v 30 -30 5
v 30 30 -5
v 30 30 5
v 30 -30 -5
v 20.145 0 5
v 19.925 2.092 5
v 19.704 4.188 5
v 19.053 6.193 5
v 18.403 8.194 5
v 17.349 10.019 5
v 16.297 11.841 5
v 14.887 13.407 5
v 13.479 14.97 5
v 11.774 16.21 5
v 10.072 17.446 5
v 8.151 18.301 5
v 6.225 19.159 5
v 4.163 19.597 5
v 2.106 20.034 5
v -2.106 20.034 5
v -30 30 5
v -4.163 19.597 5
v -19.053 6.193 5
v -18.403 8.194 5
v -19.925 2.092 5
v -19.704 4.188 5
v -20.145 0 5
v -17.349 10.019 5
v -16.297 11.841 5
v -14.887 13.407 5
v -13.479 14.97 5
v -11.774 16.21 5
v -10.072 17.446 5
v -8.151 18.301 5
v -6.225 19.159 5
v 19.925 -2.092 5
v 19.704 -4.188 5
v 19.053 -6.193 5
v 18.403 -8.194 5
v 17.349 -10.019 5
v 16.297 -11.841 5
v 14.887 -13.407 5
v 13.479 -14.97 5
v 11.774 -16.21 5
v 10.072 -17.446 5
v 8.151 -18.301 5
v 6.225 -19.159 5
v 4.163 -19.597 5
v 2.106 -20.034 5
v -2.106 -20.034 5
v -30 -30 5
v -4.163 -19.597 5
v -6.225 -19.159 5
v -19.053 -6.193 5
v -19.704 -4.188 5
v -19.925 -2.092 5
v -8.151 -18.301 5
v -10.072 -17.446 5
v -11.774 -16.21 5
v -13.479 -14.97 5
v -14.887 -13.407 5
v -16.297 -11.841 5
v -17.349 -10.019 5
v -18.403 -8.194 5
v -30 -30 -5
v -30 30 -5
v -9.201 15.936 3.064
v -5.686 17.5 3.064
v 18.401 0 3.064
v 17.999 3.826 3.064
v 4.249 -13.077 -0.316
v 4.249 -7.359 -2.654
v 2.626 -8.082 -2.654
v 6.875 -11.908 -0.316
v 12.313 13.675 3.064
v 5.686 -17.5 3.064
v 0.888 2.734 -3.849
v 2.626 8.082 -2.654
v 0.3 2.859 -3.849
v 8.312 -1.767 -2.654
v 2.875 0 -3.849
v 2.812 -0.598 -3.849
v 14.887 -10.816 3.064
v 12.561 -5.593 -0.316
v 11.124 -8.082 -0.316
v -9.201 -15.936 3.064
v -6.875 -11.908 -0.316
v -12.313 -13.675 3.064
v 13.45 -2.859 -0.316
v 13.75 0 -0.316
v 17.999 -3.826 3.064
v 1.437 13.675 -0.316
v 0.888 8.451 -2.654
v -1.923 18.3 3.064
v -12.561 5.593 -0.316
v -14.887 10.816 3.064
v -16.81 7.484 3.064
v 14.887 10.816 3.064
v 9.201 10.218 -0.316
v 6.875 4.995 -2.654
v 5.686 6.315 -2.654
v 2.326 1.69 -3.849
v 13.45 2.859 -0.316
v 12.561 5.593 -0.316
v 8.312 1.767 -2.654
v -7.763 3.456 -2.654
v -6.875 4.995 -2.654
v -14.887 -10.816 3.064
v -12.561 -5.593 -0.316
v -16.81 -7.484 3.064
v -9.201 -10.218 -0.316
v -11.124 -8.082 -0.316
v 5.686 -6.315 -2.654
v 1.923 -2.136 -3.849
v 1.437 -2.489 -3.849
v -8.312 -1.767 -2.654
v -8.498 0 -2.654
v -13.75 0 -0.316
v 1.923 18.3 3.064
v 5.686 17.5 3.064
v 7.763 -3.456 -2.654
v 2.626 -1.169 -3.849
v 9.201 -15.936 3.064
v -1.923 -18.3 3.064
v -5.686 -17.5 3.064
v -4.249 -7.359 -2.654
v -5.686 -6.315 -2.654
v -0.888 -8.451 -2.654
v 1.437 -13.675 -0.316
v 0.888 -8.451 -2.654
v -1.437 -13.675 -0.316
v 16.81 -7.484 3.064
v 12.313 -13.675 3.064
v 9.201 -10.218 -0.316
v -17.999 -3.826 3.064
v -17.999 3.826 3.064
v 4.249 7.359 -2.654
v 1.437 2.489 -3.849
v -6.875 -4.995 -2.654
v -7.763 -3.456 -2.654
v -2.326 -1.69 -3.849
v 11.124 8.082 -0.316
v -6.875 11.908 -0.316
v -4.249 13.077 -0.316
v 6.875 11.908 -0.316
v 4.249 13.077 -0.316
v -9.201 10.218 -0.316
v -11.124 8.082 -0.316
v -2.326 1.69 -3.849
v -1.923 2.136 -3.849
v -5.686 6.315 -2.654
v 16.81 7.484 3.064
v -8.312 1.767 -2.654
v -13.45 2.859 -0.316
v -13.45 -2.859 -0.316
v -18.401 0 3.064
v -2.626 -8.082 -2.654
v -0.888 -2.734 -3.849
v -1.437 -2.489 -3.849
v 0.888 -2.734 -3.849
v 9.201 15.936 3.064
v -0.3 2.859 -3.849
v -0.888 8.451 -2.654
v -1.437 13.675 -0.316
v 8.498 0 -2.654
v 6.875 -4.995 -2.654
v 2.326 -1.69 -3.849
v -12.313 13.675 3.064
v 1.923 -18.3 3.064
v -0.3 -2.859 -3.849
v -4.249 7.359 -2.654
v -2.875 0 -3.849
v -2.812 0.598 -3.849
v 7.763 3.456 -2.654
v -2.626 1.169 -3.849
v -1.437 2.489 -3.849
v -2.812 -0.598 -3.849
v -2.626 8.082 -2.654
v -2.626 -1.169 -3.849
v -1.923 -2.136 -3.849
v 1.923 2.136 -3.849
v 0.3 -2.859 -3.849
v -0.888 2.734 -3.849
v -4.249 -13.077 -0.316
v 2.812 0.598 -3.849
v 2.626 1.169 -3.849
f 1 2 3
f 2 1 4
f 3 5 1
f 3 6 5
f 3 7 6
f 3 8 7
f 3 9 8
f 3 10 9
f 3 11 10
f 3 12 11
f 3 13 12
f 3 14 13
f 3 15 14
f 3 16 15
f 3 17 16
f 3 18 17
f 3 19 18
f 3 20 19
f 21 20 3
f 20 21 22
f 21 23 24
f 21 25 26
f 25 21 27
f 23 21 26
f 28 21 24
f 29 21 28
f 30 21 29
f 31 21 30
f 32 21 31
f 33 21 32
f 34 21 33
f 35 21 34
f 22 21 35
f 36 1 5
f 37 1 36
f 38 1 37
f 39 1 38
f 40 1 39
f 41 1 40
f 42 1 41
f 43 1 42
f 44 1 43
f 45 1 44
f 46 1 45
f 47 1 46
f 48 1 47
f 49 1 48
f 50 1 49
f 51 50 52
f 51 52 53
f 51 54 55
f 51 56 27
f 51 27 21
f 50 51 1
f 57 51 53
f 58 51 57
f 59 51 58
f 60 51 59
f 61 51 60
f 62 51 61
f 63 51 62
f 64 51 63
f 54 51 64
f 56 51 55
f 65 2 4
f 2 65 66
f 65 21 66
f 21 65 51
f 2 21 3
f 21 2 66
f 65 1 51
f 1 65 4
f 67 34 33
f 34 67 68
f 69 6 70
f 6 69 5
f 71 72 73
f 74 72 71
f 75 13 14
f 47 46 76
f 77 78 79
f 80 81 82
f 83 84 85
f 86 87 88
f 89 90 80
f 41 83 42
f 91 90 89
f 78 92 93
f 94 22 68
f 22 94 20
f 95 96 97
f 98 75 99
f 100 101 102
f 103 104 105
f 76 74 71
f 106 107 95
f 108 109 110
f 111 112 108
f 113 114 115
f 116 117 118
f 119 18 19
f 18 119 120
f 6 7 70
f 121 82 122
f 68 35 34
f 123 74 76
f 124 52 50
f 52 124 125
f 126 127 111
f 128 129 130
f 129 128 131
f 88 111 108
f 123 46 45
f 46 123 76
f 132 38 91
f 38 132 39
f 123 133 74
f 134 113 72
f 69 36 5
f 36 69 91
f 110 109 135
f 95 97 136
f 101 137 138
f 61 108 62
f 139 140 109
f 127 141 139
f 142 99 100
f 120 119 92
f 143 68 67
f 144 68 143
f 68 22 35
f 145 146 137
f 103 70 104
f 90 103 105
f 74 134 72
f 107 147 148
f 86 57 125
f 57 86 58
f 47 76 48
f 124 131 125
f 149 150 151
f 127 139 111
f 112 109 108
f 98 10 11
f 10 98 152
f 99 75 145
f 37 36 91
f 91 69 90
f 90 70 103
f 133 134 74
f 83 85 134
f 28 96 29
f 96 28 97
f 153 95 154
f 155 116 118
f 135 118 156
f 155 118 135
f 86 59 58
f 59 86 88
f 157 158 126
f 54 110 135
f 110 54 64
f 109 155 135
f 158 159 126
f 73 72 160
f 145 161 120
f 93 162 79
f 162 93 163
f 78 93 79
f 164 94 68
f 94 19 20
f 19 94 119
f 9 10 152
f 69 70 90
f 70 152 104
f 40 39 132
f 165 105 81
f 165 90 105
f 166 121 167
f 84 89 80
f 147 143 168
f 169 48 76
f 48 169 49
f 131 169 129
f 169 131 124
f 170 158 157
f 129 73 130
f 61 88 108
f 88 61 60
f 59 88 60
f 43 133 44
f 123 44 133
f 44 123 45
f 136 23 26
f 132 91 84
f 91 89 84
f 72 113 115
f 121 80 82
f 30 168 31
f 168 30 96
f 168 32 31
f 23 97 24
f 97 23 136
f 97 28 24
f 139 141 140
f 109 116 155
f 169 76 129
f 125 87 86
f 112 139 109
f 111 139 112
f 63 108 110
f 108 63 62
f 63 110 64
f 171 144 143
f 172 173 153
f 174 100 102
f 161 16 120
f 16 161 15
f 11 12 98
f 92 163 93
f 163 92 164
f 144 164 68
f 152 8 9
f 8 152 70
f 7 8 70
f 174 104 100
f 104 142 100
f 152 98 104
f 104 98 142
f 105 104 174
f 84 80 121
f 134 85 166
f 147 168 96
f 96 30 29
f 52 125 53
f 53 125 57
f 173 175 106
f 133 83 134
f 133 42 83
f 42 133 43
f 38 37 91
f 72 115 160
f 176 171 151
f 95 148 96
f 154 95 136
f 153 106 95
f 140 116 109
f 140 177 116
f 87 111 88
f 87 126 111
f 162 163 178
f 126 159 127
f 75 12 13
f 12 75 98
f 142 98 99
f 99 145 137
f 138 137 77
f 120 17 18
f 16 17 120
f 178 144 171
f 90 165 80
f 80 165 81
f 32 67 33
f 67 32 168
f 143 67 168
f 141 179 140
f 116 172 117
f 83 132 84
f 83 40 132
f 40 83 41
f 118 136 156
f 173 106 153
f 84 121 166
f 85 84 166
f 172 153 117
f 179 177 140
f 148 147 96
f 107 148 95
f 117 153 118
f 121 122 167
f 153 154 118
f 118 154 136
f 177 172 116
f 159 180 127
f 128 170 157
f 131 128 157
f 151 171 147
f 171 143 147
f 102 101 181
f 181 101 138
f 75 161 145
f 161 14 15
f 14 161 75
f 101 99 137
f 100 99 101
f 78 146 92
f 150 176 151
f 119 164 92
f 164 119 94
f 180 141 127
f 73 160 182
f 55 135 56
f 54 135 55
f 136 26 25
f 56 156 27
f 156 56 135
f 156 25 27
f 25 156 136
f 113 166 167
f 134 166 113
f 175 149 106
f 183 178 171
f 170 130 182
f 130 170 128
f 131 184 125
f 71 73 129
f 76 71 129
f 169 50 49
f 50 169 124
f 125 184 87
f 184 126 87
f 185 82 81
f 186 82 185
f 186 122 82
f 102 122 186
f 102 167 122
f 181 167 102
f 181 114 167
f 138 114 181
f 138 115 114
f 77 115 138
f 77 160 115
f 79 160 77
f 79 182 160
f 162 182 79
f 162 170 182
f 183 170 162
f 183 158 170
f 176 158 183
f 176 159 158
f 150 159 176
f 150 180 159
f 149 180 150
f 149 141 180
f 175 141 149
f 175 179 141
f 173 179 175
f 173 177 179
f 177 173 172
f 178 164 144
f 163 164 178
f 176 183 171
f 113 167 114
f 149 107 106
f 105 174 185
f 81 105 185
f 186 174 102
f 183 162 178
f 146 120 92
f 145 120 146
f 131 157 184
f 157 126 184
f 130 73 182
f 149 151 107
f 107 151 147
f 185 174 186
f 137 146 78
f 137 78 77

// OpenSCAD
difference(){
    cube([60,60,10], true);
    #translate([0,0,55/2-4])sphere(55/2);
}
